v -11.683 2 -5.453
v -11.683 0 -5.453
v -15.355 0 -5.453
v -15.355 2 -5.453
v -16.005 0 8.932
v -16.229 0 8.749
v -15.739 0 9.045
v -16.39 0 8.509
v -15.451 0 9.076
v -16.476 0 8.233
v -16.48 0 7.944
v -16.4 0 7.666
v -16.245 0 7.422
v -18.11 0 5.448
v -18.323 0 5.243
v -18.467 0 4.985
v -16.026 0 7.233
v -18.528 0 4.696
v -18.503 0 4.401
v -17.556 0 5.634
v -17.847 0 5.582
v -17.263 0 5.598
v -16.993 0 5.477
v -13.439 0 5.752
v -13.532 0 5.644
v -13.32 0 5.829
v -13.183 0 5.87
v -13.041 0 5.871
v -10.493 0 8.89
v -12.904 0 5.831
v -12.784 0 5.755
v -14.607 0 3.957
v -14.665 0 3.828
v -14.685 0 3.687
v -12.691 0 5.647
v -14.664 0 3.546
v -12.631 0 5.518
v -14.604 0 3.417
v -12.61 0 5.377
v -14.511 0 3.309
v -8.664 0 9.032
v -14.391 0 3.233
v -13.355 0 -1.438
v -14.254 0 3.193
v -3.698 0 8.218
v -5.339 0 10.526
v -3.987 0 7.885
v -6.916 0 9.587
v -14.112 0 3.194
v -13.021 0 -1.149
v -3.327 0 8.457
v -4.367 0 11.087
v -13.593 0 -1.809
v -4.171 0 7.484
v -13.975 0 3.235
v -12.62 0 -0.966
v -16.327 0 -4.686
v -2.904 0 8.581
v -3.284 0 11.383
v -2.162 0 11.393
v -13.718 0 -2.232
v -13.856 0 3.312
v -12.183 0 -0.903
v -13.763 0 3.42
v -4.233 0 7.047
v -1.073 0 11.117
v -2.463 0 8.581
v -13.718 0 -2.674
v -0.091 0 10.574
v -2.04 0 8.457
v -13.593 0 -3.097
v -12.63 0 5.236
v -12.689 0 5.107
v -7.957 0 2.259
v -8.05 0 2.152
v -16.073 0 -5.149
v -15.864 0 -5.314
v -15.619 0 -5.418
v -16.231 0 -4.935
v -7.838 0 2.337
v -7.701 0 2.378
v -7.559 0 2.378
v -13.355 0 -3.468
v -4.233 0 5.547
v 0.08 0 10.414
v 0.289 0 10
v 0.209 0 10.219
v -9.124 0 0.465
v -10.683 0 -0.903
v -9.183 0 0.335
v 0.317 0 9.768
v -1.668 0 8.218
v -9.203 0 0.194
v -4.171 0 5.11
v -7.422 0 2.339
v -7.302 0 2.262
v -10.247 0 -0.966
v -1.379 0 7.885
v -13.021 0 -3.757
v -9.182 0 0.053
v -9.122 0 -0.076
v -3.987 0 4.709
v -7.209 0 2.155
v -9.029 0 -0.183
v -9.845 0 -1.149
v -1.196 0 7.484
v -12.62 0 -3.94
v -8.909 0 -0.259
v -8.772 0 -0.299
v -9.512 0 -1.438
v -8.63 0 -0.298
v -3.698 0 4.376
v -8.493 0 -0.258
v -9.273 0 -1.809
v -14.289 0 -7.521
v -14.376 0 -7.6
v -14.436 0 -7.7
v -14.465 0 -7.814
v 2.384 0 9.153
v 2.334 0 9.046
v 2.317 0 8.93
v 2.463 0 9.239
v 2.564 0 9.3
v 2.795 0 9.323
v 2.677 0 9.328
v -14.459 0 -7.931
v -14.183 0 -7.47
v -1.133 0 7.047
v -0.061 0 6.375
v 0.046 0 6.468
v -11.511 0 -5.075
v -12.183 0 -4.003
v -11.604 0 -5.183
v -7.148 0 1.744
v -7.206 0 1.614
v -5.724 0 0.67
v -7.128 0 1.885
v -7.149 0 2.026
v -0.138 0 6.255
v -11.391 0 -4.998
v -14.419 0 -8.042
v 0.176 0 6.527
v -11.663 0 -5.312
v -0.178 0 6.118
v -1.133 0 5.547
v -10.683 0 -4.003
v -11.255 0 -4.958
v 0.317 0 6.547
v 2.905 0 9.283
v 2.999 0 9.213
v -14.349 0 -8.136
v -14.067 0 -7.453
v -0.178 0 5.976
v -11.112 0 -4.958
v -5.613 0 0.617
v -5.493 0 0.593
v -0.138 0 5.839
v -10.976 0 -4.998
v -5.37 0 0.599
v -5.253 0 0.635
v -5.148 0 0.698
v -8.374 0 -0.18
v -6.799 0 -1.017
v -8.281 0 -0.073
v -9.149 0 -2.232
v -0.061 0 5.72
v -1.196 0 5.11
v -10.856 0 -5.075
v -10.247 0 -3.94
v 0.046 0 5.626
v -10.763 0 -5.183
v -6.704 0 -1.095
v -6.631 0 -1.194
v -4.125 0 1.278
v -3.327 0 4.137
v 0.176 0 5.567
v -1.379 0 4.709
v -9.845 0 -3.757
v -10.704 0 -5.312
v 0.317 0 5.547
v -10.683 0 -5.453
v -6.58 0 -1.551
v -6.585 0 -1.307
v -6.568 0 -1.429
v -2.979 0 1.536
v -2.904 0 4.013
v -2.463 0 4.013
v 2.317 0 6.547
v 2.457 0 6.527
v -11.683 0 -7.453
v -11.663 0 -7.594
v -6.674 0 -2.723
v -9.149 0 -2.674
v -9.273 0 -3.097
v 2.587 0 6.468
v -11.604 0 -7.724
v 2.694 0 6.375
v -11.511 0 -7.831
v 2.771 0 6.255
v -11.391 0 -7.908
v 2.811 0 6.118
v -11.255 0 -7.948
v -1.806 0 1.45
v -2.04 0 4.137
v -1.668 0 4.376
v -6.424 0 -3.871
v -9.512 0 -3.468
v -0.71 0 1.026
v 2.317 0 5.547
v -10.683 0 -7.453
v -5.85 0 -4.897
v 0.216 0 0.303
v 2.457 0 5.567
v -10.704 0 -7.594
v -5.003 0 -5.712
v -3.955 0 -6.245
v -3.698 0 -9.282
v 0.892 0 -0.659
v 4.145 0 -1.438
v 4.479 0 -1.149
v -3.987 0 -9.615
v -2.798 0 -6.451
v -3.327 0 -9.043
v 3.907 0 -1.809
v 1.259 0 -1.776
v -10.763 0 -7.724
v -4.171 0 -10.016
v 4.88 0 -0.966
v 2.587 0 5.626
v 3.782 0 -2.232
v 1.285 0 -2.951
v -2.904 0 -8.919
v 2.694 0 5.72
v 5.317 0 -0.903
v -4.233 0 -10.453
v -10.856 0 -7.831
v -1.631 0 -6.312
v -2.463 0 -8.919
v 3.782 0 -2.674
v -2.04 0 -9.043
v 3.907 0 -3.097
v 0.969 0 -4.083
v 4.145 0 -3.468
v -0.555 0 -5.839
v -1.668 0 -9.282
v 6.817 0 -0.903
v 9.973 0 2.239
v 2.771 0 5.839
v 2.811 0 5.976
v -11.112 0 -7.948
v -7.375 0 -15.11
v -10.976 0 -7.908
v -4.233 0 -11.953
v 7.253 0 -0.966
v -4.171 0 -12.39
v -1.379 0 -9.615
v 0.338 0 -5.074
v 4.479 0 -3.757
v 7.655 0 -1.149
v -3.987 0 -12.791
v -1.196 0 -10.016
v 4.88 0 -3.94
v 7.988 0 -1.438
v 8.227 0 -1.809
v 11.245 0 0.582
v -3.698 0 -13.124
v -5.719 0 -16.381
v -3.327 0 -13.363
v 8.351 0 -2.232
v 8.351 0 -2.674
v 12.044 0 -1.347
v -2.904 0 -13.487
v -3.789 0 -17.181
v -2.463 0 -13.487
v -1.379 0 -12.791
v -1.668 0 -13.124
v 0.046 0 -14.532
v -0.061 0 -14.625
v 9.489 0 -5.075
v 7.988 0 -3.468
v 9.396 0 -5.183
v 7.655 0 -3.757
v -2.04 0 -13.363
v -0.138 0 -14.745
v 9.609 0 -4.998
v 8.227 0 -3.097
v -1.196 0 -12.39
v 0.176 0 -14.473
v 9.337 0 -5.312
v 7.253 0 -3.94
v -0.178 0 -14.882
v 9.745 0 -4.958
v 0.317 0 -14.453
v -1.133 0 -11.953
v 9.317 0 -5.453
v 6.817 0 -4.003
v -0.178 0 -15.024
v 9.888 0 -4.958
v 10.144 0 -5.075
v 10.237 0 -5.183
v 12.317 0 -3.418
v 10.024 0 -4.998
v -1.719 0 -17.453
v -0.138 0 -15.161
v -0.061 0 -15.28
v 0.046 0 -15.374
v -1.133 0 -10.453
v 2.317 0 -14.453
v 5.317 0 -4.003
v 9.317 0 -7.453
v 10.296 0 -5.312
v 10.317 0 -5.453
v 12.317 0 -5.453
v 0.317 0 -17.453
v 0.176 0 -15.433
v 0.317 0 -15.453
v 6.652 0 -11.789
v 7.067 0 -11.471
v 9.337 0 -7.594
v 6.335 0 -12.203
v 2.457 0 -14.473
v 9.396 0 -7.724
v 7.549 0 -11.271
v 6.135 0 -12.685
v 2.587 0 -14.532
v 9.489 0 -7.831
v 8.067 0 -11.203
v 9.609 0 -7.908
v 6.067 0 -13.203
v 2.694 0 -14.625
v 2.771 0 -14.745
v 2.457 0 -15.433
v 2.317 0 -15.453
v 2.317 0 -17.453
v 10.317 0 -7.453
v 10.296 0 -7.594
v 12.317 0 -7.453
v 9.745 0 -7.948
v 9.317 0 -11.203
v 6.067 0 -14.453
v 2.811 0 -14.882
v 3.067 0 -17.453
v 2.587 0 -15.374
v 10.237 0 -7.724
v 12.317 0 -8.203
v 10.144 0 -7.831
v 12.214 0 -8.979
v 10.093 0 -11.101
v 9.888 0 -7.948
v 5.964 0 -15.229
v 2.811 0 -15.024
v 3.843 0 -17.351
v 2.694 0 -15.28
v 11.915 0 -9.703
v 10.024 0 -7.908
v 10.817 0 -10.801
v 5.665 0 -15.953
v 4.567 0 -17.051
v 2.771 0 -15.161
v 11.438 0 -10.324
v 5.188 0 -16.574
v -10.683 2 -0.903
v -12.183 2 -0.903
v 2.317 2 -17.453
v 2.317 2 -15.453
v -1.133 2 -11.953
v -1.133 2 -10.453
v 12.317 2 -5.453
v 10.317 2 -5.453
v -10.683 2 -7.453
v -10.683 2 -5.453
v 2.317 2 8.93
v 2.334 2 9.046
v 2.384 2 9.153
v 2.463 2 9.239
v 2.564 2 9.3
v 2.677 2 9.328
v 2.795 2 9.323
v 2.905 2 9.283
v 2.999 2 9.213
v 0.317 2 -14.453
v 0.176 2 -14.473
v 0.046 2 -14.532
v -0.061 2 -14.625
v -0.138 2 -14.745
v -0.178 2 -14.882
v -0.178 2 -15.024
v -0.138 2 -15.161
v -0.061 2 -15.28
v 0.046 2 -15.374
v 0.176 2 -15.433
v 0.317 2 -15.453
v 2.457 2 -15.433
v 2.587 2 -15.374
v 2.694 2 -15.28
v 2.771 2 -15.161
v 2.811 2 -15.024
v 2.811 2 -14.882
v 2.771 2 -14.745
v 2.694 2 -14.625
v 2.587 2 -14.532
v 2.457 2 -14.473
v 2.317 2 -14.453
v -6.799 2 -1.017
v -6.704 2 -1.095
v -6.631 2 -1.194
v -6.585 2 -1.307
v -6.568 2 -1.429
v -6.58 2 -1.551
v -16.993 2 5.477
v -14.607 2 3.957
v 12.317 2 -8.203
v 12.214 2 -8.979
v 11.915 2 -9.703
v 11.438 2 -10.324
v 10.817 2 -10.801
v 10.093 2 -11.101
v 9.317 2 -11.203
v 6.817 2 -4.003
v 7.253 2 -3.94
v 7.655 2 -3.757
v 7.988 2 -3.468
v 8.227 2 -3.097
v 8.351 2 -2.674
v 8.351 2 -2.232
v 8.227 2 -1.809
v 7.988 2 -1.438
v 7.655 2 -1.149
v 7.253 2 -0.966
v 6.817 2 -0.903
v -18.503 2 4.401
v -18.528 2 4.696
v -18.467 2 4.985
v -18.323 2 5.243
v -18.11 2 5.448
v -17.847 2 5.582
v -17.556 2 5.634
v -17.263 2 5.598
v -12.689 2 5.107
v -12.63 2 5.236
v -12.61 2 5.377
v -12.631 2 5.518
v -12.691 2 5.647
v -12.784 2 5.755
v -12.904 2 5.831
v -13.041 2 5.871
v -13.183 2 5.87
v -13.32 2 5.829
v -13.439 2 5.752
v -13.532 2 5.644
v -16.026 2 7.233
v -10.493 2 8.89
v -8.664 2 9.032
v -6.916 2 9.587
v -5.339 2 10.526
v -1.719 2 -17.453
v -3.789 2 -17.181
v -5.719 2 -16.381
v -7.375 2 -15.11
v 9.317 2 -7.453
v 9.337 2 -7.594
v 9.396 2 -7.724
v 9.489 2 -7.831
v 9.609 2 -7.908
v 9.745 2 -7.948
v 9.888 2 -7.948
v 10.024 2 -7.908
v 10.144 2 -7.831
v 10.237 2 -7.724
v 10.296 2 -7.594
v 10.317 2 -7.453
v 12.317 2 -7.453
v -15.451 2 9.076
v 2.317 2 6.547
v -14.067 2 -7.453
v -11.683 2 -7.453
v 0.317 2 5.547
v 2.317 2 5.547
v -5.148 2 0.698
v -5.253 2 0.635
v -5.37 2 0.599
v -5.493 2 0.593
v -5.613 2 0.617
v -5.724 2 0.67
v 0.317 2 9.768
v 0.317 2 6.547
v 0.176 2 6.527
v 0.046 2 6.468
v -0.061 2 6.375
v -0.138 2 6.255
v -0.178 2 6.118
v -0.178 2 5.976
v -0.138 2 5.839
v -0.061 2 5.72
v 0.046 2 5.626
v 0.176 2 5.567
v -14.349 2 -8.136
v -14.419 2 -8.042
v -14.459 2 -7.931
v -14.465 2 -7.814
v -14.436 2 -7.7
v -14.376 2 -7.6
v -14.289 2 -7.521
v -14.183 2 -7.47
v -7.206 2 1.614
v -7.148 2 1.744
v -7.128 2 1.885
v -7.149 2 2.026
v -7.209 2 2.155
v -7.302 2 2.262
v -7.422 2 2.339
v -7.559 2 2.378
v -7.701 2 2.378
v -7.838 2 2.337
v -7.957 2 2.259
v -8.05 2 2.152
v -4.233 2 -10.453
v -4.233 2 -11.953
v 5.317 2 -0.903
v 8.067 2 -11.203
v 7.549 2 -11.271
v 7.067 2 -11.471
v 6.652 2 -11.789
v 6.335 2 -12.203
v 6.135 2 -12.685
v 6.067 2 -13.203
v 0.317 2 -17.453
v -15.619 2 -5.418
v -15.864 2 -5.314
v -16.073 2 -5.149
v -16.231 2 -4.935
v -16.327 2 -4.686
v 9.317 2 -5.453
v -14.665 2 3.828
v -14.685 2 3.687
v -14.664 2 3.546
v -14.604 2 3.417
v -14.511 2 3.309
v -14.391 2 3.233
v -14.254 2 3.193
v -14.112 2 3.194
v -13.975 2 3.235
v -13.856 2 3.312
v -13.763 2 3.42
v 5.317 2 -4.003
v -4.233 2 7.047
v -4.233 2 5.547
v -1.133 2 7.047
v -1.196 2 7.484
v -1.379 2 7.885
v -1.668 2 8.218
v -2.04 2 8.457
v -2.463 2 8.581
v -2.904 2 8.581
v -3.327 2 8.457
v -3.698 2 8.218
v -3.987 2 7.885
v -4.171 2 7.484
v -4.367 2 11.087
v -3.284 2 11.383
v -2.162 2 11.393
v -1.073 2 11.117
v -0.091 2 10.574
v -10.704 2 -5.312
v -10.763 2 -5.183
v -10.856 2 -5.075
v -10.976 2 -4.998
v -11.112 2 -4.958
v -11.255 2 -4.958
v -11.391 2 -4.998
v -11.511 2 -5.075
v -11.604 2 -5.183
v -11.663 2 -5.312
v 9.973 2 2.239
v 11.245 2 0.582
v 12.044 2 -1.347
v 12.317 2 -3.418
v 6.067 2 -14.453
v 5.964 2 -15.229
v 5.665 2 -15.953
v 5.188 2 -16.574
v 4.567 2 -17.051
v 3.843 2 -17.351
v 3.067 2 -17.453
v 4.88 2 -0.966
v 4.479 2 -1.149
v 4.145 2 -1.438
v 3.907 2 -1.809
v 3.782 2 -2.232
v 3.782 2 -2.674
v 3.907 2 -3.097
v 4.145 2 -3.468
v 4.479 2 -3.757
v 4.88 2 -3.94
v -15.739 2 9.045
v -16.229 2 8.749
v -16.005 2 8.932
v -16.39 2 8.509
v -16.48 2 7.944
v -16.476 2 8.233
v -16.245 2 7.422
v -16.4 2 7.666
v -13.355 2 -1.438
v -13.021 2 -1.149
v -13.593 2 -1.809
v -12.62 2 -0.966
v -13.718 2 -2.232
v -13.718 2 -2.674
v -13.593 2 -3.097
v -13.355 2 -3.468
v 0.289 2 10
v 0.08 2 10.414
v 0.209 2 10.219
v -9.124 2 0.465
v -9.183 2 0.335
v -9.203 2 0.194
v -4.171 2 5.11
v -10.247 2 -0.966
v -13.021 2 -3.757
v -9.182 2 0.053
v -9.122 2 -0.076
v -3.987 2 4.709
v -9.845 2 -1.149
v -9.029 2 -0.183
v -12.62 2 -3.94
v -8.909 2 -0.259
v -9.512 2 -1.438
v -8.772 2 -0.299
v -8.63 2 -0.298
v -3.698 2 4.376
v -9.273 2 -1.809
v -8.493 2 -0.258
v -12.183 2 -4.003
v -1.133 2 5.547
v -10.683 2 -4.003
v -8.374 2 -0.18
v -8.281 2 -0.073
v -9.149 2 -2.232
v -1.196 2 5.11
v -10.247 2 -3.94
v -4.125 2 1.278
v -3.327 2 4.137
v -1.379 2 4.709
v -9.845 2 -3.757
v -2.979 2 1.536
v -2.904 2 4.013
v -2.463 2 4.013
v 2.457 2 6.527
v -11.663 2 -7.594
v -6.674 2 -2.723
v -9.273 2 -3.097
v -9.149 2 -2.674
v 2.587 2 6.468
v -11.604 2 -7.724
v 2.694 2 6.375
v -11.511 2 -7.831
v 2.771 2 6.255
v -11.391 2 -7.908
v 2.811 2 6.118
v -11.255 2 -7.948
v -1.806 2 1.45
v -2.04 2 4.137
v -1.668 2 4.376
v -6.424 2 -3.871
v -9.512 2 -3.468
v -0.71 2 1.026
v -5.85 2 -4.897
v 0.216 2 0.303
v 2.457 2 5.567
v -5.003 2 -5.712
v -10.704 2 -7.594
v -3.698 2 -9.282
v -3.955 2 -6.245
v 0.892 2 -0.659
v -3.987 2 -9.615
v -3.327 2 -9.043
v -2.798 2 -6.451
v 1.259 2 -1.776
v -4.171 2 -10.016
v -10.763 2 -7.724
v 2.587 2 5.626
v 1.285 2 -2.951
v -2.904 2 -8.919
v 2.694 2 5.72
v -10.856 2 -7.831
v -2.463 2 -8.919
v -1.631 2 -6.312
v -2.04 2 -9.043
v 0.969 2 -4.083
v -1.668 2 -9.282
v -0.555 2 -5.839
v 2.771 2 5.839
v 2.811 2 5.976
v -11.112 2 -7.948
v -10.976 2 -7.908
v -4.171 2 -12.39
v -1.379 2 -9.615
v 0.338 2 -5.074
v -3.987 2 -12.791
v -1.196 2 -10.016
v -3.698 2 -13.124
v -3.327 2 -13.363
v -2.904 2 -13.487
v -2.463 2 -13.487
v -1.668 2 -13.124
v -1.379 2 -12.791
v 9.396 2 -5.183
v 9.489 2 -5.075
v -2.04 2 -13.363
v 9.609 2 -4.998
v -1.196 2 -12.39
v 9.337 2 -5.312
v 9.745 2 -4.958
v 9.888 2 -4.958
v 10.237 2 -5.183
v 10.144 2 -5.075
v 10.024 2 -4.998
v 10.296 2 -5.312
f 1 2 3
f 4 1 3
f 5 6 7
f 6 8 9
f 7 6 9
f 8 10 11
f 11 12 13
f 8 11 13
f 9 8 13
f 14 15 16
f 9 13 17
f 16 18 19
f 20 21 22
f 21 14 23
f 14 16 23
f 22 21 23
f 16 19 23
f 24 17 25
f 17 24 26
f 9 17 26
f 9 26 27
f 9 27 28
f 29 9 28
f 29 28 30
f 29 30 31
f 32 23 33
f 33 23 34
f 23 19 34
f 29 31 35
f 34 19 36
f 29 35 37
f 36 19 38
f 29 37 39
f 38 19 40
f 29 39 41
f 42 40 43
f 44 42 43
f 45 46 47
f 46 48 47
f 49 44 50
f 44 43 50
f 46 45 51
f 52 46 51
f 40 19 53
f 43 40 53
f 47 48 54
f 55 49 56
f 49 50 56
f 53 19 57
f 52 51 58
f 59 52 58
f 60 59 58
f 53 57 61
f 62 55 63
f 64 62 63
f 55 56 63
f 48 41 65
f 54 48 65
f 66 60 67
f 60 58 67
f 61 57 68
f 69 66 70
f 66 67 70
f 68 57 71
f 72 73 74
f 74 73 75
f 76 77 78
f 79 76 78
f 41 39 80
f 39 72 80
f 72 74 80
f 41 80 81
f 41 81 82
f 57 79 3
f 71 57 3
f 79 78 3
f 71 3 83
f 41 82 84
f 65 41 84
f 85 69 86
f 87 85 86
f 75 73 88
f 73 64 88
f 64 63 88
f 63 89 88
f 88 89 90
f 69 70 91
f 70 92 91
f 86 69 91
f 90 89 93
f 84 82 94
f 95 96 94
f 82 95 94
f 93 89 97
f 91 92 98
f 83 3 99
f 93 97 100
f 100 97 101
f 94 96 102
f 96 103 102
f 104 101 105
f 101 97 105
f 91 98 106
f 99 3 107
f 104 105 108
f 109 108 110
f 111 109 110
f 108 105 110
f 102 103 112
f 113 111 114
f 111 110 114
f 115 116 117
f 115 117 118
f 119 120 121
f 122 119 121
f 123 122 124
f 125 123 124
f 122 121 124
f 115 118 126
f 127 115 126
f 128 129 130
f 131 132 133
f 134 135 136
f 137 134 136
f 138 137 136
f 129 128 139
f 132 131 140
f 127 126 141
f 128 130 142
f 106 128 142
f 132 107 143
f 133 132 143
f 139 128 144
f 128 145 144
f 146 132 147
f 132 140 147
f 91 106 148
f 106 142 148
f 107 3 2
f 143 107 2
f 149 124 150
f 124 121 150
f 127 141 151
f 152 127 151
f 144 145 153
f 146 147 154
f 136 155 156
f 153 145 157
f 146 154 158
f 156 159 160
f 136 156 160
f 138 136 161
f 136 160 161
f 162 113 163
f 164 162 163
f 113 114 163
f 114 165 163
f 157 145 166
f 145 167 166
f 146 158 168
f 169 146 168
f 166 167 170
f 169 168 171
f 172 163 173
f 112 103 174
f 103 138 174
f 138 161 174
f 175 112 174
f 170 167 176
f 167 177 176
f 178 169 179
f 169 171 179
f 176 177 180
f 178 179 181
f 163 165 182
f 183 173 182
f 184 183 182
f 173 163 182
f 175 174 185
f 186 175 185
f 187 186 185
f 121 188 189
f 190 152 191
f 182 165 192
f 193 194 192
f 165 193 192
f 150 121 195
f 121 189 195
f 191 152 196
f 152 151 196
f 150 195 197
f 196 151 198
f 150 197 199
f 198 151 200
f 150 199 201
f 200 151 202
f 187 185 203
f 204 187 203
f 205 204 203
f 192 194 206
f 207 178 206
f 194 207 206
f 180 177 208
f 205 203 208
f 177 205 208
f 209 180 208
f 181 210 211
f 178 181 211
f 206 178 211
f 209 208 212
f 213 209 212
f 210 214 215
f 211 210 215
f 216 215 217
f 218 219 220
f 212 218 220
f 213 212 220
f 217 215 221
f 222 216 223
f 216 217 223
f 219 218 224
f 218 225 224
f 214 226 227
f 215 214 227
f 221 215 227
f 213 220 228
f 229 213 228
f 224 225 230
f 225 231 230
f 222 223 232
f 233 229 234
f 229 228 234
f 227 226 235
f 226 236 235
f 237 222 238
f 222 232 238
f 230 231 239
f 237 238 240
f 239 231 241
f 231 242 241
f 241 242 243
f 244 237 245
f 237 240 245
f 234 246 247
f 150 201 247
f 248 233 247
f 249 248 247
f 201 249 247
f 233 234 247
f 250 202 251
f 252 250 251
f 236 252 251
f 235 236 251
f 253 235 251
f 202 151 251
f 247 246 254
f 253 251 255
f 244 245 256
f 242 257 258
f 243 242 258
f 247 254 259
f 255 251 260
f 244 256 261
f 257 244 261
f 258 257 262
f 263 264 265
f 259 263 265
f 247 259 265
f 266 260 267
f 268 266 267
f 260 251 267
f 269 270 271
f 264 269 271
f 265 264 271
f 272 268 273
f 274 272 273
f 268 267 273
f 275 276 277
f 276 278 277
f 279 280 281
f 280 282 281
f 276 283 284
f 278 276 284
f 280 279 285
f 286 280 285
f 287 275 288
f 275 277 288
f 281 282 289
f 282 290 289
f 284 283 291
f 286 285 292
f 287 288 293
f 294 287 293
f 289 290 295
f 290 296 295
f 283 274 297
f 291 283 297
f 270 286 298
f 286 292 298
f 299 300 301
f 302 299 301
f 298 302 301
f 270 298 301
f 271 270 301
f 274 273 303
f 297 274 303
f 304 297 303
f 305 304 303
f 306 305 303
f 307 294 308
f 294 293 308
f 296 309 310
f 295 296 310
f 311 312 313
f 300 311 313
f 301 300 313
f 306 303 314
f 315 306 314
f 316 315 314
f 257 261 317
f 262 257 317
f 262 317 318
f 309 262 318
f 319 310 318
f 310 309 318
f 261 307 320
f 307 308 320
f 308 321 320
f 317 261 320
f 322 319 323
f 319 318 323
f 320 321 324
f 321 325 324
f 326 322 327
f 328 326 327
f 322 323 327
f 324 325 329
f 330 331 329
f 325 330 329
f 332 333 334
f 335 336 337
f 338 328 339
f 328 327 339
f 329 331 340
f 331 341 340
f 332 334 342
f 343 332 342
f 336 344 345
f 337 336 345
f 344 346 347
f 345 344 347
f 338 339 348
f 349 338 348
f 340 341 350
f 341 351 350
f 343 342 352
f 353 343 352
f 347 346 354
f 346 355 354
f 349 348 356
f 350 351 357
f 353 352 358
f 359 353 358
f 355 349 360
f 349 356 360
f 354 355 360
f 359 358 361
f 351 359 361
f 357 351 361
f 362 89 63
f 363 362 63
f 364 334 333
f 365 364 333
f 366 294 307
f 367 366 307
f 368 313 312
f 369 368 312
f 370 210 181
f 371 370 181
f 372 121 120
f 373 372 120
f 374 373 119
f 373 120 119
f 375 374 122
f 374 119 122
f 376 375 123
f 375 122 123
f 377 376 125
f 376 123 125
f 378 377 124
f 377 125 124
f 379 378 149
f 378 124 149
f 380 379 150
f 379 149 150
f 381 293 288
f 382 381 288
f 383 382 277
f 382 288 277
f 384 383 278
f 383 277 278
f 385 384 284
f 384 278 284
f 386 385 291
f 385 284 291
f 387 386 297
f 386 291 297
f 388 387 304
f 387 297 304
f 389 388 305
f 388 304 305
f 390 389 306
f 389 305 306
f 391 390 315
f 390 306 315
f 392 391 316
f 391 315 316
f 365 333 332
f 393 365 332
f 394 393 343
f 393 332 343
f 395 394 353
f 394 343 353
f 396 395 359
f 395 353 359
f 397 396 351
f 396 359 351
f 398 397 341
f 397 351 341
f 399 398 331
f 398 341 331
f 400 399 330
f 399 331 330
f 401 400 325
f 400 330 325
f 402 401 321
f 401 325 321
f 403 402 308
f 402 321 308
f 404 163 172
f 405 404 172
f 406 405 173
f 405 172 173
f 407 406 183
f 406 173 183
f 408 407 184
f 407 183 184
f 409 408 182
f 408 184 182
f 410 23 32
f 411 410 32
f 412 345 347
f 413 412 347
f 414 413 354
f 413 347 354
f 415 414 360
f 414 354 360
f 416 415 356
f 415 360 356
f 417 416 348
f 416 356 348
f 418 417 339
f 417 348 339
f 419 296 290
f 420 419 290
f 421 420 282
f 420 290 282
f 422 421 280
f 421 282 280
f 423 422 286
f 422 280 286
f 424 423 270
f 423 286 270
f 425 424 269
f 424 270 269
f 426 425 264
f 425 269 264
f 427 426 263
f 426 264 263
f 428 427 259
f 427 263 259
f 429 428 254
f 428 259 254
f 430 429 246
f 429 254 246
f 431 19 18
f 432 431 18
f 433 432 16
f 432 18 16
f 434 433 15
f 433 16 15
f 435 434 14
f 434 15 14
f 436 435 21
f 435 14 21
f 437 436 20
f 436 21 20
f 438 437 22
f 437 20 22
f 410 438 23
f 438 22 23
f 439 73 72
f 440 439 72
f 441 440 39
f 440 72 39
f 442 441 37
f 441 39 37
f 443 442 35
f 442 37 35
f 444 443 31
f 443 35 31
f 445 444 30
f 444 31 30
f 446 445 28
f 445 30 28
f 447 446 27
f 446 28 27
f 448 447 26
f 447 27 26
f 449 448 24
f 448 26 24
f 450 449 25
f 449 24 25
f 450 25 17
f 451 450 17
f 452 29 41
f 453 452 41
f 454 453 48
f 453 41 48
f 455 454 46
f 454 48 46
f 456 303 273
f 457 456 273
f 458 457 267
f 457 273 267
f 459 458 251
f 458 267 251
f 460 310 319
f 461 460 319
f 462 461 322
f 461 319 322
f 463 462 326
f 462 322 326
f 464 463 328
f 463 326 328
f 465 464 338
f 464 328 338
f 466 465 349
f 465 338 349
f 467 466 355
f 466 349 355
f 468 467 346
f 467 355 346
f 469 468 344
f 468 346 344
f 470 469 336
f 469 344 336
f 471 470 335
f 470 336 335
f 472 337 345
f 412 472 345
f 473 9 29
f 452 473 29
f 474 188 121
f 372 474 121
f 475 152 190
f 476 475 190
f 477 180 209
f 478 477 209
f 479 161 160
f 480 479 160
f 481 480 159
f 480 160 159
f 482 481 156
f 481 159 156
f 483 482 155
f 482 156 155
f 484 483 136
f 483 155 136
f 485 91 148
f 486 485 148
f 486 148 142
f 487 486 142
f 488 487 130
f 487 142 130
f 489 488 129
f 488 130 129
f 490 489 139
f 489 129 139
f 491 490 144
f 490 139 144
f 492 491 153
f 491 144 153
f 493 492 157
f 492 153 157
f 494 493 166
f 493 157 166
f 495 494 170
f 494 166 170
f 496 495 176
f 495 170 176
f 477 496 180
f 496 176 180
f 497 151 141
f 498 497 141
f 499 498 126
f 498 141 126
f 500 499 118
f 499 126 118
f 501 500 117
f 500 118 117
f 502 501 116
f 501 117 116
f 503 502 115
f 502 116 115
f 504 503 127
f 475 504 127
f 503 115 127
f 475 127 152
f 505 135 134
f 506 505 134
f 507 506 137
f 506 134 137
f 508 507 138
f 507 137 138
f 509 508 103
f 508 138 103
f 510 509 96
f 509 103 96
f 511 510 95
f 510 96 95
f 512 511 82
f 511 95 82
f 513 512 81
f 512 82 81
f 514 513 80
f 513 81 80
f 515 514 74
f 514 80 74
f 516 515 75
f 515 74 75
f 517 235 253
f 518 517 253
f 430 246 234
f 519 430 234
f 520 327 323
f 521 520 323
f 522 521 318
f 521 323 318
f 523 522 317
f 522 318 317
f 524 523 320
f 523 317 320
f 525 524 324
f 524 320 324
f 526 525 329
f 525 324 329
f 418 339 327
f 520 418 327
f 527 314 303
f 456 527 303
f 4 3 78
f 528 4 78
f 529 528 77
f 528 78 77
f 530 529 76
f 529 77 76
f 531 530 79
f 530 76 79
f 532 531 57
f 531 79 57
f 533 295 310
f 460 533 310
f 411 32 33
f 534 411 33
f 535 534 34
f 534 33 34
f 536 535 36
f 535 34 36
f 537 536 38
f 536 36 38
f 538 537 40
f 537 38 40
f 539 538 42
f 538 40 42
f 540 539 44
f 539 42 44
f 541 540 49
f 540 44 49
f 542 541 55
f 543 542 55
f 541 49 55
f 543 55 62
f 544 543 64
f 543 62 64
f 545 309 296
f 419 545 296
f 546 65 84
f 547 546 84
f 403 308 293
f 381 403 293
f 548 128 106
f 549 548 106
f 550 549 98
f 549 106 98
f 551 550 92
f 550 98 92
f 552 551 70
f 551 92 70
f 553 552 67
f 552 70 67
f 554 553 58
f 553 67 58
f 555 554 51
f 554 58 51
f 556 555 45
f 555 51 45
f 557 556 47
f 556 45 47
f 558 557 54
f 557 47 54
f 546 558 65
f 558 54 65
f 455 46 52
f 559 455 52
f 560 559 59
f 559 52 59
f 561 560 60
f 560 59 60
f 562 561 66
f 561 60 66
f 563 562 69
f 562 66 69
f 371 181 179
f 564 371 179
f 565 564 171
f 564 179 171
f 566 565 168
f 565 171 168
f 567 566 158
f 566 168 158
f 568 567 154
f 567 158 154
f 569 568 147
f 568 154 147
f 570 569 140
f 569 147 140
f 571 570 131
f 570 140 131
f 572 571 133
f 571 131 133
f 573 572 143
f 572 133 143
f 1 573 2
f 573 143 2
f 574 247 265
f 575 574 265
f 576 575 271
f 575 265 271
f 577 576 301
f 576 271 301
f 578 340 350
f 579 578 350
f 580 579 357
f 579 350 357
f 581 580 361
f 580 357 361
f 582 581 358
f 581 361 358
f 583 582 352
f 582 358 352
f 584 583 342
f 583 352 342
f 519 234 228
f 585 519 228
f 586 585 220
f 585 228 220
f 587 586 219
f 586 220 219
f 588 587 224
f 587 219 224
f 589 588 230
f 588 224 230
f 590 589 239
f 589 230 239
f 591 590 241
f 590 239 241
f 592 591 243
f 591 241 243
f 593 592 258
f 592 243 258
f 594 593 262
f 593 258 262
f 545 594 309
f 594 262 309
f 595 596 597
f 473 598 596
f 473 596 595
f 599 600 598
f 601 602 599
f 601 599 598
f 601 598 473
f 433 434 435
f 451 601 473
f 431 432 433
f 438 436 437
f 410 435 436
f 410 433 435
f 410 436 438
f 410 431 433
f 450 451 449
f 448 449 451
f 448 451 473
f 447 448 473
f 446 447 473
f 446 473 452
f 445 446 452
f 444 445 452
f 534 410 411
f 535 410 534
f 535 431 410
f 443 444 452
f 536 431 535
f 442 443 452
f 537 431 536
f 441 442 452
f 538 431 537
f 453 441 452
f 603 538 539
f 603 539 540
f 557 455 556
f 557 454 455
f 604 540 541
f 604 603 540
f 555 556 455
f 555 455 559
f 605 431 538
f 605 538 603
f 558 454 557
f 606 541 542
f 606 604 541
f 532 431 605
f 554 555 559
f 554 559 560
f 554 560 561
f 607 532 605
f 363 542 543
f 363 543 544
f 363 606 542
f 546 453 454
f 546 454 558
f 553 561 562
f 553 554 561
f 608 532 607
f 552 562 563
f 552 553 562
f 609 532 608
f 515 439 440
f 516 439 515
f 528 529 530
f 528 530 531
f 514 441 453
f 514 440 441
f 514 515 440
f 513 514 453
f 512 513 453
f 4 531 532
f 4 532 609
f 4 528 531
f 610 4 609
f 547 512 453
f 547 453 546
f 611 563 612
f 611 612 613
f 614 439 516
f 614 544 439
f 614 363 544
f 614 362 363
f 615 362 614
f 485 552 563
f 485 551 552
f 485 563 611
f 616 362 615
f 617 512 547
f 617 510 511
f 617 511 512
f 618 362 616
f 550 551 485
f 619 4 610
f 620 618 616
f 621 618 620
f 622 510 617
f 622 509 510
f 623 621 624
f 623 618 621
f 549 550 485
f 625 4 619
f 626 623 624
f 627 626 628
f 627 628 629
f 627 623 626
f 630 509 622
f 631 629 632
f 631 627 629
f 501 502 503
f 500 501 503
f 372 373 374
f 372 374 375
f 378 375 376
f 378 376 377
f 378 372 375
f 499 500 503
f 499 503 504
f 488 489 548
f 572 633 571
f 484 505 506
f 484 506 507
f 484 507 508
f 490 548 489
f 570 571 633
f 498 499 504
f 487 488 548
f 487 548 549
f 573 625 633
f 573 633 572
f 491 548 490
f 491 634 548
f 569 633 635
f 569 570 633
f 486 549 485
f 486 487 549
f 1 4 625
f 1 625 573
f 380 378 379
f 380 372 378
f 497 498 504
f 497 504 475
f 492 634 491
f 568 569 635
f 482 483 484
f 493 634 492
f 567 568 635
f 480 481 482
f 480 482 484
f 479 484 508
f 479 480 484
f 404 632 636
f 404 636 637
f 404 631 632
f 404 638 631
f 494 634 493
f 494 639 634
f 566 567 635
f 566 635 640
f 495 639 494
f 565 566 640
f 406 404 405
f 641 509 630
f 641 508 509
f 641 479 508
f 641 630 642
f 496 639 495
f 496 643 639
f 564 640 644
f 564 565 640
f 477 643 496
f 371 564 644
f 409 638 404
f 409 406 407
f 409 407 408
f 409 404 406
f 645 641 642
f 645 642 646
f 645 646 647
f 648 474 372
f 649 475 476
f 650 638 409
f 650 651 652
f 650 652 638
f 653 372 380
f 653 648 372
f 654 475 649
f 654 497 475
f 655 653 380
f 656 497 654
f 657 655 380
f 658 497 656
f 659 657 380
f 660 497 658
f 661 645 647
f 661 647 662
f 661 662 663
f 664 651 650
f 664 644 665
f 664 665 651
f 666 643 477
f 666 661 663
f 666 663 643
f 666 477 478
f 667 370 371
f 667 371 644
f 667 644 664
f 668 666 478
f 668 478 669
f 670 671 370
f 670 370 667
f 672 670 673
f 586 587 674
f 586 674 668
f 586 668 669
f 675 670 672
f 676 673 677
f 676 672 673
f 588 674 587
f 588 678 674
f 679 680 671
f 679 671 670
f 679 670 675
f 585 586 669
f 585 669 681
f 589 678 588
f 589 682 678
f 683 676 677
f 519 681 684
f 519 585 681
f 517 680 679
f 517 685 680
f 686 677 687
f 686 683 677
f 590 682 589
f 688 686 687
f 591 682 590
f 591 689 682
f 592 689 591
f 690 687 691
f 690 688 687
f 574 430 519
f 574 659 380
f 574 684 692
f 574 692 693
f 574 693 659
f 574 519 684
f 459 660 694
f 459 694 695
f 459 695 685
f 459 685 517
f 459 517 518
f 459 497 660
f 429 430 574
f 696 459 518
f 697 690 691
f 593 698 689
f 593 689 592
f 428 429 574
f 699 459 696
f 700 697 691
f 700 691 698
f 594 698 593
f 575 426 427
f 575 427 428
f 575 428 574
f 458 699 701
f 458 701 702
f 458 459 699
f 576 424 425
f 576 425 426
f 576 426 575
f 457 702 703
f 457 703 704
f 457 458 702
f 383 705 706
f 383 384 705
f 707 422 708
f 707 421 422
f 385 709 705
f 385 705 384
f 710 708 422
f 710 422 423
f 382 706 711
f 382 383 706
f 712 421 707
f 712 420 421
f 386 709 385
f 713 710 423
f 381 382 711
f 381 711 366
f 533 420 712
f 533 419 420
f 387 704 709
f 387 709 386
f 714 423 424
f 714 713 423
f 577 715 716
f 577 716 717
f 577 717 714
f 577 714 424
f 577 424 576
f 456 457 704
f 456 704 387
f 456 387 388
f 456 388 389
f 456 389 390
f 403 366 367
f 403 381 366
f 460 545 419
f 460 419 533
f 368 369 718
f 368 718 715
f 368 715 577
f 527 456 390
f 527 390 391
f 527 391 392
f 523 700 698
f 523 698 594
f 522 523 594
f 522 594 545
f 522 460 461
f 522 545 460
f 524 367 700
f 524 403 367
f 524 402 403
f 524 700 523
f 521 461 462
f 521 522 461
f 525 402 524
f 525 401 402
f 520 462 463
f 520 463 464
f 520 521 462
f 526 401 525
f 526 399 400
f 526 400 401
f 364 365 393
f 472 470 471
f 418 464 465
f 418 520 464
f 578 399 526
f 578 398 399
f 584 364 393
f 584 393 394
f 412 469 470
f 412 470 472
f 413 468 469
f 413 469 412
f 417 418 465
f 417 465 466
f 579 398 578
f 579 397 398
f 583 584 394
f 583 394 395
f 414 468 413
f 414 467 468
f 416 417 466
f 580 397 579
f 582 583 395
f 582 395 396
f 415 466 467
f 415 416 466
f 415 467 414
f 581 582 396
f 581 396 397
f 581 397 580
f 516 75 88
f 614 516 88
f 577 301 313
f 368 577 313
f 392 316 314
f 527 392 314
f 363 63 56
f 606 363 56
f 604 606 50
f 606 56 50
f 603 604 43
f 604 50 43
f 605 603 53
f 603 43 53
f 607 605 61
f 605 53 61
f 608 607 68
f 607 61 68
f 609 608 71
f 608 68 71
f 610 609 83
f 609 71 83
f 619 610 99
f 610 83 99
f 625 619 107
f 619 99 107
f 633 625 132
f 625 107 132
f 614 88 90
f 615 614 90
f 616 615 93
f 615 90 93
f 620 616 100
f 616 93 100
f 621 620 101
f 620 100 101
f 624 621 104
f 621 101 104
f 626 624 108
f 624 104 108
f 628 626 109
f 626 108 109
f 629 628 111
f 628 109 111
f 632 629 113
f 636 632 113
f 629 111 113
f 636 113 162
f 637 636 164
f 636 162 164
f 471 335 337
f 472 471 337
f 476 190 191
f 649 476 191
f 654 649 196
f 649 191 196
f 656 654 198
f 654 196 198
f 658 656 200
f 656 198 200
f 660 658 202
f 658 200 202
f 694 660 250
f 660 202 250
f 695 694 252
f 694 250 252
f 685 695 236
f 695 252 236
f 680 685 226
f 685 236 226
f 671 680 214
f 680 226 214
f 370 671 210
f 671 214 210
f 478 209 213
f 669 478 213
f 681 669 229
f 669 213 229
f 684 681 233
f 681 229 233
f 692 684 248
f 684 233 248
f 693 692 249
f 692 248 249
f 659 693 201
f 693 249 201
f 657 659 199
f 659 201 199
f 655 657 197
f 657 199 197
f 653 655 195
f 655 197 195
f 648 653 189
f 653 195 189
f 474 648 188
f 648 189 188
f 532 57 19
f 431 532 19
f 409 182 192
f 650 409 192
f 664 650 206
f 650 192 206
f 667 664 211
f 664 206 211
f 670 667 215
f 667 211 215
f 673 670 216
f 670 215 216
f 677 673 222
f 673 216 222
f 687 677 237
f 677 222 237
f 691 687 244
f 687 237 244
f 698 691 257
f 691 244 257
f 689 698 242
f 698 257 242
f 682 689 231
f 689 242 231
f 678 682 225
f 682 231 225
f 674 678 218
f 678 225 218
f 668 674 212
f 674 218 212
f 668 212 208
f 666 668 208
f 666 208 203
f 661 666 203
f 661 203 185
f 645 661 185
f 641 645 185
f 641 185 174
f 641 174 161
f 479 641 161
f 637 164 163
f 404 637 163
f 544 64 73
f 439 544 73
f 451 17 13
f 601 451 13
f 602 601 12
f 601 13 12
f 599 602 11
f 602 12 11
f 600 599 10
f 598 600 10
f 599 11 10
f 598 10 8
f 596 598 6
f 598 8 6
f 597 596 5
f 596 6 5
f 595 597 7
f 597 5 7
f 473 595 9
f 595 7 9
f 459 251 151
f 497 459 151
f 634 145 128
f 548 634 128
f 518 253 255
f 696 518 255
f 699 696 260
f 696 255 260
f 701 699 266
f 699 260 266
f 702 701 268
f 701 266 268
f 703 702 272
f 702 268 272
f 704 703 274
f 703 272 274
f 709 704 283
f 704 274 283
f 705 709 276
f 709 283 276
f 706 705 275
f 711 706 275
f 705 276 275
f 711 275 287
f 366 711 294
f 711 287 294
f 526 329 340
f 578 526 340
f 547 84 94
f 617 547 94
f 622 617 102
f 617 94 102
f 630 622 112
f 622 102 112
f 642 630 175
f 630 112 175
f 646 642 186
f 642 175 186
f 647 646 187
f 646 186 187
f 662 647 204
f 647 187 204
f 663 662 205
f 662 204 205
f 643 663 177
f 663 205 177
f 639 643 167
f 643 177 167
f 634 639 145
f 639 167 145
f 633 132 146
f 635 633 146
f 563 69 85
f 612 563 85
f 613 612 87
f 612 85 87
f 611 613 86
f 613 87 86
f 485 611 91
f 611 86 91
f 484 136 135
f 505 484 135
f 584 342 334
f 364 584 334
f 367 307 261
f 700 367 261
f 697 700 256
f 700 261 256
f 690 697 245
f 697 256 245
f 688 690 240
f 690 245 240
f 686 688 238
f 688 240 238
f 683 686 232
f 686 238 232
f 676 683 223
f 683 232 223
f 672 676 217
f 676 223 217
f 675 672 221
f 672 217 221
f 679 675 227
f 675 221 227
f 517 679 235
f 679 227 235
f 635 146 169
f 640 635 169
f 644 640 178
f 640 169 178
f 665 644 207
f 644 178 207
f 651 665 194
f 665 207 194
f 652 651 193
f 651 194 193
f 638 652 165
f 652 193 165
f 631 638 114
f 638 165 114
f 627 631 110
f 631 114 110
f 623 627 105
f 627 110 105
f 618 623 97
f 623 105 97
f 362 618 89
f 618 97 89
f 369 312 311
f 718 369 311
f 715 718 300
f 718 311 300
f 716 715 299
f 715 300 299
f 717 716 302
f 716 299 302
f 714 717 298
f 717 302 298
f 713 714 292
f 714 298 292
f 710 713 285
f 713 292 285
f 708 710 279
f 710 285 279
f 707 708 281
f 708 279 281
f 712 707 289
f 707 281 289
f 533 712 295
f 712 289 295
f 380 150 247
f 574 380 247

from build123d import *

# Parameters (mm, degrees)
BOSS_EXTRUDE1_DEPTH = 2


with BuildPart() as part:
    # Sketch2 → Boss-Extrude1 (new body)
    with BuildSketch(Plane(origin=(0, 0, 0), x_dir=(1, 0, 0), z_dir=(0, 1, 0))):
        with BuildLine():
            Line((-10.683420839, 7.453272885), (-10.683420839, 5.453272885))
            ThreePointArc((-10.683420839, 5.453272885), (-11.183420839, 4.953272885), (-11.683420839, 5.453272885))
            Line((-11.683420839, 5.453272885), (-15.35489401, 5.453272885))
            ThreePointArc((-15.35489401, 5.453272885), (-15.974254556, 5.238379575), (-16.327422226, 4.686057913))
            Line((-16.327422226, 4.686057913), (-18.502568846, -4.401259626))
            ThreePointArc((-18.502568846, -4.401259626), (-18.110467141, -5.448357286), (-16.992741021, -5.477436099))
            Line((-16.992741021, -5.477436099), (-14.606504965, -3.957236073))
            ThreePointArc((-14.606504965, -3.957236073), (-14.453459047, -3.266890545), (-13.76311352, -3.419936464))
            Line((-13.76311352, -3.419936464), (-12.688514303, -5.106719356))
            ThreePointArc((-12.688514303, -5.106719356), (-12.841560222, -5.797064883), (-13.531905749, -5.644018964))
            Line((-13.531905749, -5.644018964), (-16.026002021, -7.232933527))
            ThreePointArc((-16.026002021, -7.232933527), (-16.443355206, -8.374046414), (-15.451333197, -9.075626513))
            Line((-15.451333197, -9.075626513), (-10.493019061, -8.890208712))
            ThreePointArc((-10.493019061, -8.890208712), (-7.77384357, -9.259496243), (-5.339433215, -10.525961738))
            ThreePointArc((-5.339433215, -10.525961738), (-2.723247428, -11.423772675), (-0.091156592, -10.57371951))
            ThreePointArc((-0.091156592, -10.57371951), (0.208841524, -10.219493021), (0.316579161, -9.767975715))
            Line((0.316579161, -9.767975715), (0.316579161, -6.547082806))
            ThreePointArc((0.316579161, -6.547082806), (-0.183420839, -6.047082806), (0.316579161, -5.547082806))
            Line((0.316579161, -5.547082806), (2.316579161, -5.547082806))
            ThreePointArc((2.316579161, -5.547082806), (2.816579161, -6.047082806), (2.316579161, -6.547082806))
            Line((2.316579161, -6.547082806), (2.316579161, -8.930282652))
            ThreePointArc((2.316579161, -8.930282652), (2.563505788, -9.299834465), (2.999421874, -9.213125364))
            Line((2.999421874, -9.213125364), (9.973433411, -2.239113827))
            ThreePointArc((9.973433411, -2.239113827), (11.707615421, 0.356272963), (12.316579161, 3.417740422))
            Line((12.316579161, 3.417740422), (12.316579161, 5.453272885))
            Line((12.316579161, 5.453272885), (10.316579161, 5.453272885))
            ThreePointArc((10.316579161, 5.453272885), (9.816579161, 4.953272885), (9.316579161, 5.453272885))
            Line((9.316579161, 5.453272885), (9.316579161, 7.453272885))
            ThreePointArc((9.316579161, 7.453272885), (9.816579161, 7.953272885), (10.316579161, 7.453272885))
            Line((10.316579161, 7.453272885), (12.316579161, 7.453272885))
            Line((12.316579161, 7.453272885), (12.316579161, 8.202917194))
            ThreePointArc((12.316579161, 8.202917194), (11.437899505, 10.324237538), (9.316579161, 11.202917194))
            Line((9.316579161, 11.202917194), (8.066579161, 11.202917194))
            ThreePointArc((8.066579161, 11.202917194), (6.652365599, 11.788703632), (6.066579161, 13.202917194))
            Line((6.066579161, 13.202917194), (6.066579161, 14.452917194))
            ThreePointArc((6.066579161, 14.452917194), (5.187899505, 16.574237538), (3.066579161, 17.452917194))
            Line((3.066579161, 17.452917194), (2.316579161, 17.452917194))
            Line((2.316579161, 17.452917194), (2.316579161, 15.452917194))
            ThreePointArc((2.316579161, 15.452917194), (2.816579161, 14.952917194), (2.316579161, 14.452917194))
            Line((2.316579161, 14.452917194), (0.316579161, 14.452917194))
            ThreePointArc((0.316579161, 14.452917194), (-0.183420839, 14.952917194), (0.316579161, 15.452917194))
            Line((0.316579161, 15.452917194), (0.316579161, 17.453272885))
            Line((0.316579161, 17.453272885), (-1.718597611, 17.453272885))
            ThreePointArc((-1.718597611, 17.453272885), (-4.78006507, 16.844309145), (-7.37545186, 15.110127135))
            Line((-7.37545186, 15.110127135), (-14.349463397, 8.136115598))
            ThreePointArc((-14.349463397, 8.136115598), (-14.436172498, 7.700199512), (-14.066620685, 7.453272885))
            Line((-14.066620685, 7.453272885), (-11.683420839, 7.453272885))
            ThreePointArc((-11.683420839, 7.453272885), (-11.183420839, 7.953272885), (-10.683420839, 7.453272885))
        make_face()
        with BuildLine():
            Line((-1.133420839, 11.952917194), (-1.133420839, 10.452917194))
            ThreePointArc((-1.133420839, 10.452917194), (-2.683420839, 8.902917194), (-4.233420839, 10.452917194))
            Line((-4.233420839, 10.452917194), (-4.233420839, 11.952917194))
            ThreePointArc((-4.233420839, 11.952917194), (-2.683420839, 13.502917194), (-1.133420839, 11.952917194))
        make_face(mode=Mode.SUBTRACT)
        with BuildLine():
            Line((5.316579161, 4.002917194), (6.816579161, 4.002917194))
            ThreePointArc((6.816579161, 4.002917194), (8.366579161, 2.452917194), (6.816579161, 0.902917194))
            Line((6.816579161, 0.902917194), (5.316579161, 0.902917194))
            ThreePointArc((5.316579161, 0.902917194), (3.766579161, 2.452917194), (5.316579161, 4.002917194))
        make_face(mode=Mode.SUBTRACT)
        with BuildLine():
            Line((-1.133420839, -5.547082806), (-1.133420839, -7.047082806))
            ThreePointArc((-1.133420839, -7.047082806), (-2.683420839, -8.597082806), (-4.233420839, -7.047082806))
            Line((-4.233420839, -7.047082806), (-4.233420839, -5.547082806))
            ThreePointArc((-4.233420839, -5.547082806), (-2.683420839, -3.997082806), (-1.133420839, -5.547082806))
        make_face(mode=Mode.SUBTRACT)
        with BuildLine():
            Line((-10.683420839, 0.902917194), (-12.183420839, 0.902917194))
            ThreePointArc((-12.183420839, 0.902917194), (-13.733420839, 2.452917194), (-12.183420839, 4.002917194))
            Line((-12.183420839, 4.002917194), (-10.683420839, 4.002917194))
            ThreePointArc((-10.683420839, 4.002917194), (-9.133420839, 2.452917194), (-10.683420839, 0.902917194))
        make_face(mode=Mode.SUBTRACT)
        with BuildLine():
            Line((-8.281069122, 0.07251099), (-6.79892731, 1.016739461))
            ThreePointArc((-6.79892731, 1.016739461), (-6.604759329, 1.249227104), (-6.580448639, 1.551155407))
            ThreePointArc((-6.580448639, 1.551155407), (0.690144945, 4.602115628), (-5.147649684, -0.697888449))
            ThreePointArc((-5.147649684, -0.697888449), (-5.431563797, -0.592321001), (-5.724328093, -0.670043431))
            Line((-5.724328093, -0.670043431), (-7.206469905, -1.614271902))
            ThreePointArc((-7.206469905, -1.614271902), (-7.359515824, -2.304617429), (-8.049861351, -2.15157151))
            Line((-8.049861351, -2.15157151), (-9.124460568, -0.464788618))
            ThreePointArc((-9.124460568, -0.464788618), (-8.971414649, 0.225556909), (-8.281069122, 0.07251099))
        make_face(mode=Mode.SUBTRACT)
    extrude(amount=BOSS_EXTRUDE1_DEPTH)


solid = part.part
